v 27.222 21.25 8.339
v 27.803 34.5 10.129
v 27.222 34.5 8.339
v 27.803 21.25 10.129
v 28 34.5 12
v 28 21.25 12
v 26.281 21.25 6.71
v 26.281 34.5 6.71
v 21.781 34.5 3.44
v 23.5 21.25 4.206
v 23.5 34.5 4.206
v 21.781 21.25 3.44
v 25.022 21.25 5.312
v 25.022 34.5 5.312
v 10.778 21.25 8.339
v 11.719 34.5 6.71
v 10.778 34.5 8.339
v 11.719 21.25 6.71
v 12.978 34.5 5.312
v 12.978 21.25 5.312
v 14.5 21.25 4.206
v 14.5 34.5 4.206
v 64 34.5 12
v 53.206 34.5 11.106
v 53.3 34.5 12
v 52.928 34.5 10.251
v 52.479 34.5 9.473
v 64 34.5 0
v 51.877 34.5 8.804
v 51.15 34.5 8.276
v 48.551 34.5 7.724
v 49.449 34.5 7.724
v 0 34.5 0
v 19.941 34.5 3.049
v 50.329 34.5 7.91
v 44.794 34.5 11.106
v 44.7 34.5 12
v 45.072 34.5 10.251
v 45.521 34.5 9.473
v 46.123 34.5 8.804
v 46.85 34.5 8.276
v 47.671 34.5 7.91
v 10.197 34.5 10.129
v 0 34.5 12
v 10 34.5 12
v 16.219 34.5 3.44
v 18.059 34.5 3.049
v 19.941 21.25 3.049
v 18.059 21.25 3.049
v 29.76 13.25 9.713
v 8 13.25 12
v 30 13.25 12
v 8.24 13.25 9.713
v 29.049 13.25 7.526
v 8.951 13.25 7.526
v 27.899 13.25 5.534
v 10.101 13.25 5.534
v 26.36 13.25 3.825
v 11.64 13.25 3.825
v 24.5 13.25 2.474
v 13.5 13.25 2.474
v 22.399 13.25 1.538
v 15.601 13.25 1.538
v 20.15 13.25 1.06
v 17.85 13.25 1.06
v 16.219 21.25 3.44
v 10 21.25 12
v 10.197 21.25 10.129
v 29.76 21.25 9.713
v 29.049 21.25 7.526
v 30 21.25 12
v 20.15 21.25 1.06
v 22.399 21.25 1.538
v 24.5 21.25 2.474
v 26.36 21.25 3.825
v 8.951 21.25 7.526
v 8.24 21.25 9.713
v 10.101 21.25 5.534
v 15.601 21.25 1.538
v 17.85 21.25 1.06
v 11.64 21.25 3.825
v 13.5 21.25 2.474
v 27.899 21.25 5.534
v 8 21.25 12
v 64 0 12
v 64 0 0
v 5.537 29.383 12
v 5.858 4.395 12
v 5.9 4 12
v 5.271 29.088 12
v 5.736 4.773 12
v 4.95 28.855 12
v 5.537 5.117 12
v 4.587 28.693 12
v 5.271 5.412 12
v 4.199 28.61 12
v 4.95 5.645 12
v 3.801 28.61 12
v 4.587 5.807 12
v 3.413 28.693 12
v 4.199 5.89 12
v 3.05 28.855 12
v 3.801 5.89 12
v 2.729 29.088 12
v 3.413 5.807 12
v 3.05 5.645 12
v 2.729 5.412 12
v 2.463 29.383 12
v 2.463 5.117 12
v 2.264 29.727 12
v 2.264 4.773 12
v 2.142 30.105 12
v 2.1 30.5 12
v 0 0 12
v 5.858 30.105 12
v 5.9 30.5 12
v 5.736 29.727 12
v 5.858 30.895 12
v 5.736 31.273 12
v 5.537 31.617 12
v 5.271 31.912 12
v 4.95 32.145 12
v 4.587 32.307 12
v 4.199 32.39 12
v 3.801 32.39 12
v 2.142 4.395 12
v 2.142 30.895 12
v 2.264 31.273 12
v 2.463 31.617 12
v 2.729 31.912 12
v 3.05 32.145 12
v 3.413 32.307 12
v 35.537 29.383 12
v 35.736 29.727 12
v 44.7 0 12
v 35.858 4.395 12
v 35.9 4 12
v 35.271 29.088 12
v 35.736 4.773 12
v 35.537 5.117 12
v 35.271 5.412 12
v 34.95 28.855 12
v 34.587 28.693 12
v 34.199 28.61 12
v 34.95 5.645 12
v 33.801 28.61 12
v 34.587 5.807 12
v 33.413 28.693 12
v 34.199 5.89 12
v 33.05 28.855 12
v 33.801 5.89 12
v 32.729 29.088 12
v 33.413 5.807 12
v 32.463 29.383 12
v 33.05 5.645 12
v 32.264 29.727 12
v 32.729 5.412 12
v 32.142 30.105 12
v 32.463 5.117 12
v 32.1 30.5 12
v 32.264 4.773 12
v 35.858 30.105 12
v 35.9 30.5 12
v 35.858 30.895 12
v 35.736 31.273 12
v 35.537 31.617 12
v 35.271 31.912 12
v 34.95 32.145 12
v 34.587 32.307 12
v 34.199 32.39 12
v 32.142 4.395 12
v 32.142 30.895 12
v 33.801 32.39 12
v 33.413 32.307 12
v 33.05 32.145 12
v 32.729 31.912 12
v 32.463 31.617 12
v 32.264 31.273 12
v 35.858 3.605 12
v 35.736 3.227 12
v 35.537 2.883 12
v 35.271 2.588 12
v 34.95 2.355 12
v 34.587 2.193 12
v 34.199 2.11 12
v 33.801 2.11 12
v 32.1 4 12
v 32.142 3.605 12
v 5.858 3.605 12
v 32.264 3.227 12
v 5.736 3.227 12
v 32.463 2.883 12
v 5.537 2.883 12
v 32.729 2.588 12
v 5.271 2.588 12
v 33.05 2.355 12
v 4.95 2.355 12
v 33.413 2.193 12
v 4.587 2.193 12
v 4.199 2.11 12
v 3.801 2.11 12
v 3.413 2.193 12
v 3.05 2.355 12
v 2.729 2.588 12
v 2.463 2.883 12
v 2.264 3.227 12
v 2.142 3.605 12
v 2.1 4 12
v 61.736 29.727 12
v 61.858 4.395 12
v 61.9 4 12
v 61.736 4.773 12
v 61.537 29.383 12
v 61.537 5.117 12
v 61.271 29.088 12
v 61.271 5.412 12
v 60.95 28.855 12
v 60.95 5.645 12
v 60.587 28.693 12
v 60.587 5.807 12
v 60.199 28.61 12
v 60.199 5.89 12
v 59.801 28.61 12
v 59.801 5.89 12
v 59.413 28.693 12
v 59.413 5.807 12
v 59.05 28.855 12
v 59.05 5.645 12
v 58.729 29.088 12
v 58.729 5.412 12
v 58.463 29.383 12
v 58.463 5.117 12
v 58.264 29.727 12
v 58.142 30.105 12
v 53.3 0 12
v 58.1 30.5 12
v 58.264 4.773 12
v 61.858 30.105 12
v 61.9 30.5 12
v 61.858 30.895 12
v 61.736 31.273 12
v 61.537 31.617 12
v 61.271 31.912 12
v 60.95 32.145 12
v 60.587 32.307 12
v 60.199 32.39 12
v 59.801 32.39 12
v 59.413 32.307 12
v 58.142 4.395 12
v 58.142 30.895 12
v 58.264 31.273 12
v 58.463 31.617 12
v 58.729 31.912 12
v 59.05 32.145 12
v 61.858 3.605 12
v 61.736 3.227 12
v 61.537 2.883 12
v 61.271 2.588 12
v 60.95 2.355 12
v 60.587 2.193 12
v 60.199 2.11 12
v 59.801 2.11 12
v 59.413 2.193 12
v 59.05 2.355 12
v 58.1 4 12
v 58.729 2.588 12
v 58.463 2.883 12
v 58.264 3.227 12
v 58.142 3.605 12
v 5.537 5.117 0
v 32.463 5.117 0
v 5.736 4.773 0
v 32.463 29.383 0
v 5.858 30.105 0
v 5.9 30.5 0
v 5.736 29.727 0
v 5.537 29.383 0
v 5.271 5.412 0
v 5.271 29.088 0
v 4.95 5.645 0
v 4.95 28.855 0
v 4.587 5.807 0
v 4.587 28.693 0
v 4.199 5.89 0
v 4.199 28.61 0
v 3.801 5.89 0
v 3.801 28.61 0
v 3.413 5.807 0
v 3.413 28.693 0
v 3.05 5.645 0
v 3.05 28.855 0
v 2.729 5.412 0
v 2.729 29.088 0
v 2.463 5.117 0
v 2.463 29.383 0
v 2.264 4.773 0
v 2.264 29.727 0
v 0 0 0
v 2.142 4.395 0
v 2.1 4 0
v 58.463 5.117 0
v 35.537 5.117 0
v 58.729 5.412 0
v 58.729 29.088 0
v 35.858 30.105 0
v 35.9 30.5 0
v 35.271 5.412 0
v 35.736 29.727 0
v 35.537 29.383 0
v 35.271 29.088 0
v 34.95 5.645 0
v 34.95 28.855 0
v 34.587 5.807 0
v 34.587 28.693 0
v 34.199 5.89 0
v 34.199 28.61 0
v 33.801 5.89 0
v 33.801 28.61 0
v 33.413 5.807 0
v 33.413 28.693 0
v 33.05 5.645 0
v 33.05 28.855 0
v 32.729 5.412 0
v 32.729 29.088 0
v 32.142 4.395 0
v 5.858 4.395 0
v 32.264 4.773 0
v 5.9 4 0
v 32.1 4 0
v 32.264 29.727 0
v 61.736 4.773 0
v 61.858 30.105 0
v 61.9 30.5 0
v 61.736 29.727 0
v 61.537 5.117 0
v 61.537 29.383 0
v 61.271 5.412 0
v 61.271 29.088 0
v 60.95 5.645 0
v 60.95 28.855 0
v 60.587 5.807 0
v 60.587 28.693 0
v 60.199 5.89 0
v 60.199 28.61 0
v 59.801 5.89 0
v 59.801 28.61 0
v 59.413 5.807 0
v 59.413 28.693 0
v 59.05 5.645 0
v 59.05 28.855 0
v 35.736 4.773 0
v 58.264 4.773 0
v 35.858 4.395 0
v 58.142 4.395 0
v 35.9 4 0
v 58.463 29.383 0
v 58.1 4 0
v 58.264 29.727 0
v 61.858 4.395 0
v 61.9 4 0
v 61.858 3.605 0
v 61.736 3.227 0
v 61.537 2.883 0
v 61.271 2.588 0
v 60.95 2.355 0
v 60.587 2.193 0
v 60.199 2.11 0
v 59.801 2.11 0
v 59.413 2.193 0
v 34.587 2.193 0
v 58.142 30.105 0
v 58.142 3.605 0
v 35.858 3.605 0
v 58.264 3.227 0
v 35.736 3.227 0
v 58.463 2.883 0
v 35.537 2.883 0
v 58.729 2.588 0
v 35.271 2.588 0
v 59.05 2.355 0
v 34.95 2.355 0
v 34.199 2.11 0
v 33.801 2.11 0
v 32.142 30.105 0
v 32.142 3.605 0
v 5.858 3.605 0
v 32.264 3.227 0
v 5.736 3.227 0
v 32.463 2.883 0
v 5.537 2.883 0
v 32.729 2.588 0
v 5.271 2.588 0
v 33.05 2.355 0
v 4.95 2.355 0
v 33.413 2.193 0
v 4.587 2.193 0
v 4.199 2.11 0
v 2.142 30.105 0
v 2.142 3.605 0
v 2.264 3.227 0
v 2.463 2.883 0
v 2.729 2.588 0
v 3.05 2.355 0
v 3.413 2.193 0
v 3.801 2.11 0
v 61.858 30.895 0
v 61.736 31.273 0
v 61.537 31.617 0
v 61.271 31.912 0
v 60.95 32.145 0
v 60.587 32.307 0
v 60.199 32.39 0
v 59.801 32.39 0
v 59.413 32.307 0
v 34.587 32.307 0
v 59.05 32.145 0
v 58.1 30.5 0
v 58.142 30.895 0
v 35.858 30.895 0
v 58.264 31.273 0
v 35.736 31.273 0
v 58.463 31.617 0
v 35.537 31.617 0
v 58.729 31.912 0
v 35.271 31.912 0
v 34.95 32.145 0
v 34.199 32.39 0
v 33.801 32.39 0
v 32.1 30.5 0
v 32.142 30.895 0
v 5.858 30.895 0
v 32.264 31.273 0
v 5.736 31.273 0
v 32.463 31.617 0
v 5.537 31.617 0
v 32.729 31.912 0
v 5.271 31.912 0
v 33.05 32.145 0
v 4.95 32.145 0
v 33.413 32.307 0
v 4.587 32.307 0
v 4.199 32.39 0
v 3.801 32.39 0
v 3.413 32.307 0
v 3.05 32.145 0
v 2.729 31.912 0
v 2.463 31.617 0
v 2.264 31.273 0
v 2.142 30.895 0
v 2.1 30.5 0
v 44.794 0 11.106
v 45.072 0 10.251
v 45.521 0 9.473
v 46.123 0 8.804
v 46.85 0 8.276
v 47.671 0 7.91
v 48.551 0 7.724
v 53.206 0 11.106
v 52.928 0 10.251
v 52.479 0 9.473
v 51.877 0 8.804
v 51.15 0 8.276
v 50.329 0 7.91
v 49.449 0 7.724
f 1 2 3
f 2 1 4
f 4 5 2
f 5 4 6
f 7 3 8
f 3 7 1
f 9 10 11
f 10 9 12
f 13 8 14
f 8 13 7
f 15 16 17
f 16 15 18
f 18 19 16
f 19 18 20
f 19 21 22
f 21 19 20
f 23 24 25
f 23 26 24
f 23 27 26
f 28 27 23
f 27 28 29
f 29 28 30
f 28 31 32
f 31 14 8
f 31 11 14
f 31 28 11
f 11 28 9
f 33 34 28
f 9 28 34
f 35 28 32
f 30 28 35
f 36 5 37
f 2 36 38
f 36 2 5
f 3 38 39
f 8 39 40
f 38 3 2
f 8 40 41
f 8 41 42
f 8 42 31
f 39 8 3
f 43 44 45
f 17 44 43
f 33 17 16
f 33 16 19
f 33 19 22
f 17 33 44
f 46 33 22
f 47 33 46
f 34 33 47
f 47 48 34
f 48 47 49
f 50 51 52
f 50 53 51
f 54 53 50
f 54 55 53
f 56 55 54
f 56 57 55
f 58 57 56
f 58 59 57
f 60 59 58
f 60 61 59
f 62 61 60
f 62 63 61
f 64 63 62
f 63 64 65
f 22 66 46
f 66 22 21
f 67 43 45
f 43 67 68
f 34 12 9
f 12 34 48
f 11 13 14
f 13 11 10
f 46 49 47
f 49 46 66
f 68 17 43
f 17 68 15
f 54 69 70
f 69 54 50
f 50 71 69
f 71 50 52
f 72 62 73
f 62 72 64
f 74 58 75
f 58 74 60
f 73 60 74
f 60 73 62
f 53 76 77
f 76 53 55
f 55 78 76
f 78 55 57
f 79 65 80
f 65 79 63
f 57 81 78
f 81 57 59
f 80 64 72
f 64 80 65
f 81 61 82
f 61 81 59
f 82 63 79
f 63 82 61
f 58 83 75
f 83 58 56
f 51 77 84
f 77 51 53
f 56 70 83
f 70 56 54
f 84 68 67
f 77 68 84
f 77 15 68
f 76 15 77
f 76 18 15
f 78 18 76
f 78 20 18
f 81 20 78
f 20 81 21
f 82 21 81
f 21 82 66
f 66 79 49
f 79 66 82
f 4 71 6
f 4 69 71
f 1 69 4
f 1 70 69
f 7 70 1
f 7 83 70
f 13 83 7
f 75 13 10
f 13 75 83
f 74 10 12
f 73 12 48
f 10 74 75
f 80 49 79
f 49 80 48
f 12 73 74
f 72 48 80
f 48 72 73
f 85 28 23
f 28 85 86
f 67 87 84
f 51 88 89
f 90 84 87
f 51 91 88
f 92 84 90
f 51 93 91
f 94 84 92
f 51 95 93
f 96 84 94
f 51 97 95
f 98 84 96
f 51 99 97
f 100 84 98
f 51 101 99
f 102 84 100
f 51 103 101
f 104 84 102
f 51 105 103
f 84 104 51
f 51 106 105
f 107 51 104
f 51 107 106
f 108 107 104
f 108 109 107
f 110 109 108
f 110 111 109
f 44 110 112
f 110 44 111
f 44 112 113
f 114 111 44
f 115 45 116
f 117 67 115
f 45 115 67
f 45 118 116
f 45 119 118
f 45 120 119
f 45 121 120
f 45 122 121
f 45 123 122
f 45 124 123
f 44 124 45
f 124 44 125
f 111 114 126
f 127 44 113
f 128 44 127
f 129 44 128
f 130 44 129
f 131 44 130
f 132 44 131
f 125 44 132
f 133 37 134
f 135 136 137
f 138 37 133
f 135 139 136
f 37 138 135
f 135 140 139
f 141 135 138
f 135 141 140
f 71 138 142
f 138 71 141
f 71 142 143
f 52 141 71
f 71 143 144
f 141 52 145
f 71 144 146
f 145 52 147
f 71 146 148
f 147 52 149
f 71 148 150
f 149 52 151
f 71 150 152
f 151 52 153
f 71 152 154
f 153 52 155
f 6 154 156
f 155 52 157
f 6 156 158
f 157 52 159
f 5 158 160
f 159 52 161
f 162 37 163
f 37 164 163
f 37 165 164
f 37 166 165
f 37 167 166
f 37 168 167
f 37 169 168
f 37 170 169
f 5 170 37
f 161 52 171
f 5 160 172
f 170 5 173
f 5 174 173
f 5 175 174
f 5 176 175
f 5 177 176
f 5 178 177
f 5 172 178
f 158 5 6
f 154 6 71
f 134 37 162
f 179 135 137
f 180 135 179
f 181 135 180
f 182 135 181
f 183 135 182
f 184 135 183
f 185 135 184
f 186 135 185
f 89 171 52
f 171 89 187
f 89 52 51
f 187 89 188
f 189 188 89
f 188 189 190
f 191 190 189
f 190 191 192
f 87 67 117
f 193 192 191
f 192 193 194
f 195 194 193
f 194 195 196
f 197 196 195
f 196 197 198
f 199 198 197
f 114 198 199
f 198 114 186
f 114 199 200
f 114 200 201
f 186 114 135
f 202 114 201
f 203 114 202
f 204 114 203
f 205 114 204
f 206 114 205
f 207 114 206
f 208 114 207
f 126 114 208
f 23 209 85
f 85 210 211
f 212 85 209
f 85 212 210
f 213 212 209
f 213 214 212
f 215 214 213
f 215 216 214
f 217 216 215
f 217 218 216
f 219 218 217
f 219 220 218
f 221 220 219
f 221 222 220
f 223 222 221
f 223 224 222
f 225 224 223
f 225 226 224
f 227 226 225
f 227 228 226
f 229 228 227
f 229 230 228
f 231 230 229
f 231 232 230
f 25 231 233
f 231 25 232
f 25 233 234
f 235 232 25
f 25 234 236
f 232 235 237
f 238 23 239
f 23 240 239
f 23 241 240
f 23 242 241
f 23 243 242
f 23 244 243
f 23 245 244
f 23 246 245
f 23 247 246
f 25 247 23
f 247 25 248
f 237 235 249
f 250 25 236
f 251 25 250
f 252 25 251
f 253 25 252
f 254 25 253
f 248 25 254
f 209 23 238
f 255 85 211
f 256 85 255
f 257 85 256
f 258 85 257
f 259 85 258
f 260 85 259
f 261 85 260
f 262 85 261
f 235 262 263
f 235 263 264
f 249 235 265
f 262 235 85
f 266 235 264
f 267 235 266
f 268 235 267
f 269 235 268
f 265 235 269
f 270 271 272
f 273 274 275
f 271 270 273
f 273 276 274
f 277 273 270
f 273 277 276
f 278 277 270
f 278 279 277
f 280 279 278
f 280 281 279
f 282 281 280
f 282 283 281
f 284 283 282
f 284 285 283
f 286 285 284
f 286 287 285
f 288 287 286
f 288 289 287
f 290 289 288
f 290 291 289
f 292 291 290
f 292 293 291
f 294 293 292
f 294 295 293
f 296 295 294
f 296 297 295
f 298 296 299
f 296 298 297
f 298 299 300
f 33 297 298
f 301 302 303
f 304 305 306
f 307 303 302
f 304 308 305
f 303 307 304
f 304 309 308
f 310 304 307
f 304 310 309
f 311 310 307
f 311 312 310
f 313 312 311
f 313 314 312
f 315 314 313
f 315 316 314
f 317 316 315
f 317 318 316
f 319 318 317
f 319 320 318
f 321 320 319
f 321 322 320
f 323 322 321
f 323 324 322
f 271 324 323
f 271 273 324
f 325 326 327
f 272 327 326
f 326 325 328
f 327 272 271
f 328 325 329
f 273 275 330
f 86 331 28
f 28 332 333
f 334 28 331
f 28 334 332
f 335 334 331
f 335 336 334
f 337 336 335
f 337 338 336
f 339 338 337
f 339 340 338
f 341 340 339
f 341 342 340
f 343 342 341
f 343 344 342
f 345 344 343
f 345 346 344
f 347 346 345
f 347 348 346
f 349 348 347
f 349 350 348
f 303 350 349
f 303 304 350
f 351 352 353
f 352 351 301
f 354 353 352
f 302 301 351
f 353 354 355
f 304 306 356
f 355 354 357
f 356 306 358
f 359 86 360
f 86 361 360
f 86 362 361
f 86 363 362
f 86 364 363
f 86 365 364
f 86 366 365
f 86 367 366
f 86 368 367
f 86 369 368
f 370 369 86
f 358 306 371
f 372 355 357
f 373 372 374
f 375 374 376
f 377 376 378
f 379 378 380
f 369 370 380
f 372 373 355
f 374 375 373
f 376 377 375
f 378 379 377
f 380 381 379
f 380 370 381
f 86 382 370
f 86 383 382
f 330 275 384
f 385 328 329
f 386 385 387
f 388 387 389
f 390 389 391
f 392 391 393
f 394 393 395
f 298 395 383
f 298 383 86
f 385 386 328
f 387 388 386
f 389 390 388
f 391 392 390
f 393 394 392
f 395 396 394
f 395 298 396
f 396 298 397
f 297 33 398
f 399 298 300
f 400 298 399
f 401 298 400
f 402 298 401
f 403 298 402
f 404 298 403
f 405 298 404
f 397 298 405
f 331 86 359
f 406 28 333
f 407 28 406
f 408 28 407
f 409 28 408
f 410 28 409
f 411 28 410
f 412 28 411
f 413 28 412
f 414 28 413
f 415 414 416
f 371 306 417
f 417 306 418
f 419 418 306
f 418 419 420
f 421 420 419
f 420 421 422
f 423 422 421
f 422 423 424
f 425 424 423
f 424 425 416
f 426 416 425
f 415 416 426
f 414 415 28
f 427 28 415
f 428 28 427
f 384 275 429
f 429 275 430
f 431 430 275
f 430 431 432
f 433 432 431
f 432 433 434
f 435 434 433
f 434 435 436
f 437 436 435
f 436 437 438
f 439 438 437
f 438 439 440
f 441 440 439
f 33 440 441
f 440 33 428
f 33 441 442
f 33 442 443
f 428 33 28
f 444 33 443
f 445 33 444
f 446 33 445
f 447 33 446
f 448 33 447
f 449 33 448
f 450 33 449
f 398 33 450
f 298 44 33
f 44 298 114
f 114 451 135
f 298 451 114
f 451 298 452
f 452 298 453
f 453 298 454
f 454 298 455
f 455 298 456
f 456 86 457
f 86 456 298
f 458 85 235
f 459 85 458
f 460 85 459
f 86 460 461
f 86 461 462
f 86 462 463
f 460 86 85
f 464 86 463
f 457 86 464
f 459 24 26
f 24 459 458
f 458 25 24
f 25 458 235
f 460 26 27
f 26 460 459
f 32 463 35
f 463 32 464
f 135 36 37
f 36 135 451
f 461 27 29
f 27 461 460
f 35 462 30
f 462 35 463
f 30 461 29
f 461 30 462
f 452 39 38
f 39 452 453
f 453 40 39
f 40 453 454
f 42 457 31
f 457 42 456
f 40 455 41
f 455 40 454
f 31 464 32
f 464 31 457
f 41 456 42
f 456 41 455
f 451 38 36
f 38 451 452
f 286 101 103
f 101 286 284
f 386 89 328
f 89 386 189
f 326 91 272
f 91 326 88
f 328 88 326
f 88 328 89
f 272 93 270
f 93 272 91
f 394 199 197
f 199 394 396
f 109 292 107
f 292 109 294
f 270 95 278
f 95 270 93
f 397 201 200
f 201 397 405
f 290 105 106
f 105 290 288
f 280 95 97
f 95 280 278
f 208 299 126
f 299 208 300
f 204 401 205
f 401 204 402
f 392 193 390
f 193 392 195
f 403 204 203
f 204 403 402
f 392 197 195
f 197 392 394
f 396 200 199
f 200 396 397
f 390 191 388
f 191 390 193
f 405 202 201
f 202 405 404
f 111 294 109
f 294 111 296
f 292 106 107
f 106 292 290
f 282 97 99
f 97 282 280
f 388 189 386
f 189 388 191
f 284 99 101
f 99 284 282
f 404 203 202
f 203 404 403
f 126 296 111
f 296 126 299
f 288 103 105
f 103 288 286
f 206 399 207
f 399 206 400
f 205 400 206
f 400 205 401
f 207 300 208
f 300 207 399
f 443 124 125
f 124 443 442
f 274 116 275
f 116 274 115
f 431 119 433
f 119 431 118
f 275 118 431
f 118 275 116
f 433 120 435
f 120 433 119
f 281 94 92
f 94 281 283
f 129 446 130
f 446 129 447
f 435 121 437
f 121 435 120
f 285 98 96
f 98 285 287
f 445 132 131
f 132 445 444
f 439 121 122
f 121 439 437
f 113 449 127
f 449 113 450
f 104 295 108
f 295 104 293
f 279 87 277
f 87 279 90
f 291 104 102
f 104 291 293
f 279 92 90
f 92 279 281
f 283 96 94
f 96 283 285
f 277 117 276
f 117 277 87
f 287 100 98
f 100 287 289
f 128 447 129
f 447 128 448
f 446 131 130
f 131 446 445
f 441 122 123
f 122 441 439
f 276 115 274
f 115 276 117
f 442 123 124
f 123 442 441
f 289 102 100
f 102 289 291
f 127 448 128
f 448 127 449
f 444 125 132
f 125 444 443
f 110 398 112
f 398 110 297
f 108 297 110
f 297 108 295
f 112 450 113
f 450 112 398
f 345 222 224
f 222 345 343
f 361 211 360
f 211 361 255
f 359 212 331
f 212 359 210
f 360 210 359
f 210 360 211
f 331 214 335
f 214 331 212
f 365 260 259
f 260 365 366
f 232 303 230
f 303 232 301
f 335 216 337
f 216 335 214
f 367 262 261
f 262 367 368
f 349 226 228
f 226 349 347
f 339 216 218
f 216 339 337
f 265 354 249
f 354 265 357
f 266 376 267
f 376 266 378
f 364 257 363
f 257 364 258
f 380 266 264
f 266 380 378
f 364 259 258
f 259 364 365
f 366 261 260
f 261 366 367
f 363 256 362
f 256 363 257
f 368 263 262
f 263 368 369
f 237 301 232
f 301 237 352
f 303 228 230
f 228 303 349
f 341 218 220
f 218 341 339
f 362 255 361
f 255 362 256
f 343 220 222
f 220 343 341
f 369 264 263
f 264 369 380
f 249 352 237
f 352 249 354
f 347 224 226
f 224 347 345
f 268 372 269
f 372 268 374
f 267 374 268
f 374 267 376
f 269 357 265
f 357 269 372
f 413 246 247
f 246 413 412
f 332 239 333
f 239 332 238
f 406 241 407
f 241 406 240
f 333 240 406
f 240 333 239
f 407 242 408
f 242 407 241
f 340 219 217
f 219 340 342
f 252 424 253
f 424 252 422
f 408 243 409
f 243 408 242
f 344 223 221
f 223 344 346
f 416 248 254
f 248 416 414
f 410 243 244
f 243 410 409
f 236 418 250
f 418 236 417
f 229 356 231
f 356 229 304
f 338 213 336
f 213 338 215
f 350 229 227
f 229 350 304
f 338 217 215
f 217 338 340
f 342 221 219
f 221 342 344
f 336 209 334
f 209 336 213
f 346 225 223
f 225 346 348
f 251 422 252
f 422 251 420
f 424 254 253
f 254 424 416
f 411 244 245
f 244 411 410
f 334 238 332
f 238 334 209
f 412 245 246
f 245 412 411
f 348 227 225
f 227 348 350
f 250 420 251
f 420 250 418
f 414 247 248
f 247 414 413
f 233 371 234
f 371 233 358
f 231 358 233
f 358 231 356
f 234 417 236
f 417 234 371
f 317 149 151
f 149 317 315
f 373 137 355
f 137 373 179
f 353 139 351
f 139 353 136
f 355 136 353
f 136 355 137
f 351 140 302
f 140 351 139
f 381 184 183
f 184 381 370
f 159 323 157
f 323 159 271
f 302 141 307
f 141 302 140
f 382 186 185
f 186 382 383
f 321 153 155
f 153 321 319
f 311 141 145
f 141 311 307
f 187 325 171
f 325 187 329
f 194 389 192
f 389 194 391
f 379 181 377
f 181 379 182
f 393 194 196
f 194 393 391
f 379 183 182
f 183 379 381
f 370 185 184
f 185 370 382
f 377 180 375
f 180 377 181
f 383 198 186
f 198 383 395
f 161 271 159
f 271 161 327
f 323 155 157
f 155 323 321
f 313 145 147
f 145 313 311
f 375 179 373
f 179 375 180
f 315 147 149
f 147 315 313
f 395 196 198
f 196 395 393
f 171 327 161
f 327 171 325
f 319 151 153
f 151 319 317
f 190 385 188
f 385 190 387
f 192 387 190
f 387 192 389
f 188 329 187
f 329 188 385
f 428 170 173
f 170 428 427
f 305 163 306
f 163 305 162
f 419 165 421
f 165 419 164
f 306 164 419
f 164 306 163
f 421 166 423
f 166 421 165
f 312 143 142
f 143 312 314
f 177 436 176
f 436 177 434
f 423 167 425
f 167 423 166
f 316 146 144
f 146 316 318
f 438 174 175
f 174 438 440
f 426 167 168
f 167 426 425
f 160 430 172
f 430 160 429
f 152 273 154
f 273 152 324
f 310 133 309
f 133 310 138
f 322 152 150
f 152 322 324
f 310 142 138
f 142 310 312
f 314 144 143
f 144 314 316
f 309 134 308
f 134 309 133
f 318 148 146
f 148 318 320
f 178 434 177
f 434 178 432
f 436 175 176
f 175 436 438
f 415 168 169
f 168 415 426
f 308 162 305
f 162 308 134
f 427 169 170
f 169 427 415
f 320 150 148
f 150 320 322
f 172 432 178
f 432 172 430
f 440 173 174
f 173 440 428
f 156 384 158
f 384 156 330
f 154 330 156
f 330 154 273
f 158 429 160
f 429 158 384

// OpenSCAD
// file: shared_variables.scad
// sled
sled_length = 29.5;
sled_width = 34.5;
sled_x_distance = 17.5;
sled_y_distance = 23.5;
sled_screw_hole_diameter = 4.5;
sled_screw_head_diameter = 8.2;
sled_screw_head_th = 3;

// nema 17 stepper motor
motor_width = 45;
motor_mount_height = 40;

// roundbar
axle_holder_width = 30;
axle_set_depth = 12;
roundbar_diameter = 8 + 0.6;
axle_mount_hole_center = (axle_holder_width - roundbar_diameter) / 4;
axle_fastener_height = 11;

// axle_bearing
bearing_diameter = 22;
bearing_thickness = 8;
bearing_mount_width = bearing_diameter + 16;

// general
y_axle_distance = 30;
bottom_th = 8;
wall_th = 8;
sled_clearing_distance = 10 + 2;
motor_backset = 30;
axle_height = 20;
motor_mount_width = motor_width / 2 + y_axle_distance + axle_holder_width / 2;
m3_hole_d = 3.8;
// file: sled_negative.scad
include <shared_variables.scad>

sled_negative();

module sled_negative() {
    translate([-sled_x_distance / 2, -sled_y_distance/2, 0])
        cylinder(d = sled_screw_hole_diameter, h = bottom_th);
    translate([sled_x_distance / 2, -sled_y_distance/2, 0])
        cylinder(d = sled_screw_hole_diameter, h = bottom_th);
    translate([-sled_x_distance / 2, sled_y_distance/2, 0])
        cylinder(d = sled_screw_hole_diameter, h = bottom_th);
    translate([sled_x_distance / 2, sled_y_distance/2, 0])
        cylinder(d = sled_screw_hole_diameter, h = bottom_th);

    translate([-sled_x_distance / 2, -sled_y_distance/2, 4])
        cylinder(d = sled_screw_head_diameter, h = motor_mount_height / 2 - 4);
    translate([sled_x_distance / 2, -sled_y_distance/2, 4])
        cylinder(d = sled_screw_head_diameter, h = motor_mount_height / 2 - 4);
    translate([-sled_x_distance / 2, sled_y_distance/2, 4])
        cylinder(d = sled_screw_head_diameter, h = motor_mount_height / 2 - 4);
    translate([sled_x_distance / 2, sled_y_distance/2, 4])
        cylinder(d = sled_screw_head_diameter, h = motor_mount_height / 2 - 4);
}
// file: nema_17_negative.scad
include <shared_variables.scad>

nema_17_negative();

module nema_17_negative() {
    rotate([270,0,0]) {
        translate([0, 0, 0]) cylinder(d = 25, h = 40);

        translate([-15.5, -15.5, 6.8]) cylinder(d = 6, h = 33, $fn=15);
        translate([15.5, -15.5, 6.8]) cylinder(d = 6, h = 33, $fn=15);
        translate([15.5, 15.5, 6.8]) cylinder(d = 6, h = 33, $fn=15);
        translate([-15.5, 15.5, 6.8]) cylinder(d = 6, h = 33, $fn=15);

        translate([-15.5, -15.5, 0]) cylinder(d = 3.5, h = wall_th, $fn=15);
        translate([15.5, -15.5, 0]) cylinder(d = 3.5, h = wall_th, $fn=15);
        translate([15.5, 15.5, 0]) cylinder(d = 3.5, h = wall_th, $fn=15);
        translate([-15.5, 15.5, 0]) cylinder(d = 3.5, h = wall_th, $fn=15);
    }
}
// main file
use <nema_17_negative.scad>
use <sled_negative.scad>
include <shared_variables.scad>

bottom_y = 40;

$fn = 30;
mount_length = bearing_mount_width / 2 + y_axle_distance + axle_holder_width / 2;

top_height = 12;

    difference() {
        // base shape
        cube([mount_length, sled_width, top_height]);
        // bearing mount
        translate([bearing_mount_width / 2, sled_width / 2 - bearing_thickness / 2, top_height])
        rotate([270, 0, 0]) {           
            cylinder(d = bearing_diameter - 4, h = sled_width / 2 + bearing_thickness / 2);
            cylinder(d = bearing_diameter, h = bearing_thickness);
        }
        // roundbar mount
        translate([bearing_mount_width / 2 + y_axle_distance, 0, top_height])
            rotate([270, 0, 0])
                cylinder(d = roundbar_diameter, h = sled_width);
        // clam downs
        translate([4, 4, top_height - 12]) cylinder(d = m3_hole_d, h = 12);
        translate([4, sled_width - 4, top_height - 12]) cylinder(d = m3_hole_d, h = 12);
        translate([mount_length - 4, 4, top_height - 12]) cylinder(d = m3_hole_d, h = 12);
        translate([mount_length - 4, sled_width - 4, top_height - 12]) cylinder(d = m3_hole_d, h = 12);
        translate([bearing_mount_width - 4, 4, top_height - 12]) cylinder(d = m3_hole_d, h = 12);
        translate([bearing_mount_width - 4, sled_width - 4, top_height - 12]) cylinder(d = m3_hole_d, h = 12);
    }
